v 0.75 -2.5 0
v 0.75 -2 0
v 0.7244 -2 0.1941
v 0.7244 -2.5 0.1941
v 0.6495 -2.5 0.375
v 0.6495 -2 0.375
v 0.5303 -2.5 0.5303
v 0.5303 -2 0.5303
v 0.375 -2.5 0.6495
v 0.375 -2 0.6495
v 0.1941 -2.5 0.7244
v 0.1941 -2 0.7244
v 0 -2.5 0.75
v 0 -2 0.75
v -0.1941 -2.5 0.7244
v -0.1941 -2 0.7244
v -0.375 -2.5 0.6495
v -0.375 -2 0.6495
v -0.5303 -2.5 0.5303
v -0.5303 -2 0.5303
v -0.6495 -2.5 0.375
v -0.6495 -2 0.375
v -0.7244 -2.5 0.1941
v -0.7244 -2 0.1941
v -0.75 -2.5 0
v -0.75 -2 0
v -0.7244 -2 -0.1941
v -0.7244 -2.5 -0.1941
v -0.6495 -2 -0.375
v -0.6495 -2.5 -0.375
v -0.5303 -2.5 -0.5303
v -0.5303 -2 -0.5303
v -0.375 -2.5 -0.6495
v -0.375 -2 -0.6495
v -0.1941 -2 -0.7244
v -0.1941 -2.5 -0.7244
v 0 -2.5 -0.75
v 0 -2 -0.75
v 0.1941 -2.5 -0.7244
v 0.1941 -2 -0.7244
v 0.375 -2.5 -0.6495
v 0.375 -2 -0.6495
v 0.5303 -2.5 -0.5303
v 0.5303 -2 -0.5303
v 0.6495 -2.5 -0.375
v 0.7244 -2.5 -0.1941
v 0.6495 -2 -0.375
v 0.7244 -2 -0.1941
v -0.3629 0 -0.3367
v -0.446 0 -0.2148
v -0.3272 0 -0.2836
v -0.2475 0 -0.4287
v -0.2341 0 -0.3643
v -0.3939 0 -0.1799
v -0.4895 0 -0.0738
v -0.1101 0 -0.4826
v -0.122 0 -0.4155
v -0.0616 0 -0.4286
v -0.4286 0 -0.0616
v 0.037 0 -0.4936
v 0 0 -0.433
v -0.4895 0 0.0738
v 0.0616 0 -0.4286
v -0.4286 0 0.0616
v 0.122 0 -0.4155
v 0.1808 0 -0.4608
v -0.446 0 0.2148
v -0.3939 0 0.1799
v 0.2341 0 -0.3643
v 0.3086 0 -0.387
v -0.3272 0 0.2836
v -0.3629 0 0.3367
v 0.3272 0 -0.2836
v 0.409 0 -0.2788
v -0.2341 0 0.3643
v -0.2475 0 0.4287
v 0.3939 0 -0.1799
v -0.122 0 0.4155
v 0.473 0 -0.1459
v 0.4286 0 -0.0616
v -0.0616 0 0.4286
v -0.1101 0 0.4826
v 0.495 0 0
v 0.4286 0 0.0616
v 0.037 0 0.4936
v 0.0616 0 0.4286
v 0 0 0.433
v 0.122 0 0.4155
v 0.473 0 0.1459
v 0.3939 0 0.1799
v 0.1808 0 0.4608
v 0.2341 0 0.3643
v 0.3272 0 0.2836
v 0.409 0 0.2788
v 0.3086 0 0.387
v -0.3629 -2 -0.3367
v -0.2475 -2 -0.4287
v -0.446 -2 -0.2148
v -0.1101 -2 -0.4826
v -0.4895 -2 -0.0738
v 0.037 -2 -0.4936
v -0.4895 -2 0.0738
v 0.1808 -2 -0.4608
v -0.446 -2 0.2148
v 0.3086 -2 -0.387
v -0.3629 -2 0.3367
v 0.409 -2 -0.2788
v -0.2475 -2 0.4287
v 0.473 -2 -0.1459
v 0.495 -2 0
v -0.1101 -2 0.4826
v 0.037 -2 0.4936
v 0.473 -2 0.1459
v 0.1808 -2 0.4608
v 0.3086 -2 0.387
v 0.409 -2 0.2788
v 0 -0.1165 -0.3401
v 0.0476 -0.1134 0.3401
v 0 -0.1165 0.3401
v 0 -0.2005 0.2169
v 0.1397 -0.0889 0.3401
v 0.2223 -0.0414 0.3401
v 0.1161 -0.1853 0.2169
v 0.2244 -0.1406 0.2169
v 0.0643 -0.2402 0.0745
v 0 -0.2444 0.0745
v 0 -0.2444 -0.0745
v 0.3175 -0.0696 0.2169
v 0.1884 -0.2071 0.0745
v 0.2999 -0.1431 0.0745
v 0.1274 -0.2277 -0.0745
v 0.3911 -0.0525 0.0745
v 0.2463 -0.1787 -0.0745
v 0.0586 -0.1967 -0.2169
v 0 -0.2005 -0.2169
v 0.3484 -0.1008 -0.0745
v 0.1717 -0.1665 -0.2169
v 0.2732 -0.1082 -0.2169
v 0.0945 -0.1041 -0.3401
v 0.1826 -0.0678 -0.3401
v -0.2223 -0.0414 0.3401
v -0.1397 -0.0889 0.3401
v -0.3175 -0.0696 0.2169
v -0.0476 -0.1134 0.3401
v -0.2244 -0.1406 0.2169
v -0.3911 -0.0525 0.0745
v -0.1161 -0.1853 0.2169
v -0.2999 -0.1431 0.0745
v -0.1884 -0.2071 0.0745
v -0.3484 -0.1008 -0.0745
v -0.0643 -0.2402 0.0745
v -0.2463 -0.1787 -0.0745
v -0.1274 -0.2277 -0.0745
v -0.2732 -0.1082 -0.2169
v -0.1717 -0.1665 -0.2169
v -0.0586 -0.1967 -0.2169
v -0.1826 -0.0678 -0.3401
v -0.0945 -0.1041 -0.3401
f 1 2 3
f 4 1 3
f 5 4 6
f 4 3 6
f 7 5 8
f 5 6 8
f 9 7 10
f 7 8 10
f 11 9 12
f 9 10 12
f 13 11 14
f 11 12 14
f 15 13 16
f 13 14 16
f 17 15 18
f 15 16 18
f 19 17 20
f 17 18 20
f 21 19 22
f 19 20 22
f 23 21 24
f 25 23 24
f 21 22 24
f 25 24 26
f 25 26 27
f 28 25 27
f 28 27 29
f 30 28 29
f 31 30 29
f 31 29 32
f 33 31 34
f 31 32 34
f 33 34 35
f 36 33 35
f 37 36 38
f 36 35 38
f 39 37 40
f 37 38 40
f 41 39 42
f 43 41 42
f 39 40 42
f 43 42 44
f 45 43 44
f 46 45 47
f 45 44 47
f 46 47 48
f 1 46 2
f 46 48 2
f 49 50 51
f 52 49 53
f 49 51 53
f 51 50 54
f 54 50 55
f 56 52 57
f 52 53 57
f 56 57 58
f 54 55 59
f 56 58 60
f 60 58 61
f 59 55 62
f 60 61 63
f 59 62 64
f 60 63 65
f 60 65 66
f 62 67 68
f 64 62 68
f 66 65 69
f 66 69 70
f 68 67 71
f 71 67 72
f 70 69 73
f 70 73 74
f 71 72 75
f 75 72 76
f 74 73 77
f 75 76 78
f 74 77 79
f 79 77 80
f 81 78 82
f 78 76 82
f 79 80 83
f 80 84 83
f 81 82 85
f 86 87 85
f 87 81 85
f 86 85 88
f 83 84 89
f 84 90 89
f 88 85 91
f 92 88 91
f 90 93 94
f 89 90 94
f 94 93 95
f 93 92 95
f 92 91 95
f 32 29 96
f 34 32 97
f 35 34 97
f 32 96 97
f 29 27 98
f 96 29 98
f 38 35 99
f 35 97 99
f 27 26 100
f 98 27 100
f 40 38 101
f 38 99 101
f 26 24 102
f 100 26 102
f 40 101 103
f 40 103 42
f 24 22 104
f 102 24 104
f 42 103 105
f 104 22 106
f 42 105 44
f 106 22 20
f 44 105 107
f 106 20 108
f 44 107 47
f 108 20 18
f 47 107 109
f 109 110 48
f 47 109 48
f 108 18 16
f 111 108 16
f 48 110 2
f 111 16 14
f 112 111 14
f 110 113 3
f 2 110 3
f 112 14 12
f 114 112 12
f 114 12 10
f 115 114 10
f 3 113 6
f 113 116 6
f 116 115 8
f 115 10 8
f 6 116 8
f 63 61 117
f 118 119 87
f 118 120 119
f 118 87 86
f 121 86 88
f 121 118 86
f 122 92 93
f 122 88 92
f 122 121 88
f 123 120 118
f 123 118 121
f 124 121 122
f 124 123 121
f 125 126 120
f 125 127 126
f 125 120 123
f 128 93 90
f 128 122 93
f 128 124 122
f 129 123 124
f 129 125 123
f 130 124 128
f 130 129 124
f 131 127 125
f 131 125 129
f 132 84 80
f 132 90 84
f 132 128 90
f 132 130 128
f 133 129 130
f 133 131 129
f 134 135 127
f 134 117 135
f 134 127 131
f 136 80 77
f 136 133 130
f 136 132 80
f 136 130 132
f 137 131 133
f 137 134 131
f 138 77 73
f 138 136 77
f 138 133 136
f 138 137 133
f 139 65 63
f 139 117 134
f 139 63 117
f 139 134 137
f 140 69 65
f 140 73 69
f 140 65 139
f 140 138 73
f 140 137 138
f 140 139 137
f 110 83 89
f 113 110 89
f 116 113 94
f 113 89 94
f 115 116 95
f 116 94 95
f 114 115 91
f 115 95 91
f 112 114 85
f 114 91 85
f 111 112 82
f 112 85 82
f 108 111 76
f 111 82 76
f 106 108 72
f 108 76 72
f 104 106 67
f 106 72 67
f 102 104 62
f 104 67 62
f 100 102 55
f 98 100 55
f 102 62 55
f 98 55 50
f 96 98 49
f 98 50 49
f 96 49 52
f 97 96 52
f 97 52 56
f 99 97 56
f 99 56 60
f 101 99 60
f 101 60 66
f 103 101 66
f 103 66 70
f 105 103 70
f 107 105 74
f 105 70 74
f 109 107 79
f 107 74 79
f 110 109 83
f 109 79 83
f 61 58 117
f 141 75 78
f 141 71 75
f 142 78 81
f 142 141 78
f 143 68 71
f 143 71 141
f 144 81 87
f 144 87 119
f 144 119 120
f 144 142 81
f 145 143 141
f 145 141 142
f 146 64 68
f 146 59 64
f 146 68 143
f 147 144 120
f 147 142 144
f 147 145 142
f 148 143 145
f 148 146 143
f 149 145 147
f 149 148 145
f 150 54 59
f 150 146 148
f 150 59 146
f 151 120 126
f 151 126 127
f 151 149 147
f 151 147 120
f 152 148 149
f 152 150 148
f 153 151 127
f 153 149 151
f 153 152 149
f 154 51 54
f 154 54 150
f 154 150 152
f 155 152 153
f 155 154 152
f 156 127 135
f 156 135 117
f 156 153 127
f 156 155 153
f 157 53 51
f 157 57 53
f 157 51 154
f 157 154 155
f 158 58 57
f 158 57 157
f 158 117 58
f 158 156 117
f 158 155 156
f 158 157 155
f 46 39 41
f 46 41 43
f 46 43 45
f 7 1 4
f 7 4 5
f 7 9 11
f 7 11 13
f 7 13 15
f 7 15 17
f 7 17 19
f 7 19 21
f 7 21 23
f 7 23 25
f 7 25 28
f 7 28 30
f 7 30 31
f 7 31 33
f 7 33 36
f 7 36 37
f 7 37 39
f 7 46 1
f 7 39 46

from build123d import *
from build123d import SkipClean  # not in build123d's __all__

# Parameters (mm, degrees)
F0_R     = 0.495
F1_DEPTH = 2
F2_R     = 0.75
F2_R_2   = 0.495
F3_DEPTH = 0.5


with BuildPart() as f1:
    # F0 (on Front) → F1 (new body)
    with BuildSketch(Plane.XZ):
        Circle(F0_R)
    extrude(amount=F1_DEPTH)

    # F2 (on face) → F3 (join)
    with BuildSketch(Plane.XZ.offset(2)):
        Circle(F2_R)
        Circle(F2_R_2, mode=Mode.SUBTRACT)
        Circle(F2_R_2)
    extrude(amount=F3_DEPTH)

    # F4 (on Right) → F5 (revolve, cut)
    with BuildSketch(Plane.YZ):
        with BuildLine():
            Line((0.25, 0), (0.25, 0.5))
            ThreePointArc((0.25, 0.5), (-0.25, 0), (0.25, -0.5))
            Line((0.25, -0.5), (0.25, 0))
        make_face()
    with SkipClean():  # cleaning this boolean's faces spoils the solid; the shape is the same uncleaned
        revolve(axis=Axis((0, 0.25, 0.25), (0, 0, 1)), mode=Mode.SUBTRACT)


solid = f1.part
